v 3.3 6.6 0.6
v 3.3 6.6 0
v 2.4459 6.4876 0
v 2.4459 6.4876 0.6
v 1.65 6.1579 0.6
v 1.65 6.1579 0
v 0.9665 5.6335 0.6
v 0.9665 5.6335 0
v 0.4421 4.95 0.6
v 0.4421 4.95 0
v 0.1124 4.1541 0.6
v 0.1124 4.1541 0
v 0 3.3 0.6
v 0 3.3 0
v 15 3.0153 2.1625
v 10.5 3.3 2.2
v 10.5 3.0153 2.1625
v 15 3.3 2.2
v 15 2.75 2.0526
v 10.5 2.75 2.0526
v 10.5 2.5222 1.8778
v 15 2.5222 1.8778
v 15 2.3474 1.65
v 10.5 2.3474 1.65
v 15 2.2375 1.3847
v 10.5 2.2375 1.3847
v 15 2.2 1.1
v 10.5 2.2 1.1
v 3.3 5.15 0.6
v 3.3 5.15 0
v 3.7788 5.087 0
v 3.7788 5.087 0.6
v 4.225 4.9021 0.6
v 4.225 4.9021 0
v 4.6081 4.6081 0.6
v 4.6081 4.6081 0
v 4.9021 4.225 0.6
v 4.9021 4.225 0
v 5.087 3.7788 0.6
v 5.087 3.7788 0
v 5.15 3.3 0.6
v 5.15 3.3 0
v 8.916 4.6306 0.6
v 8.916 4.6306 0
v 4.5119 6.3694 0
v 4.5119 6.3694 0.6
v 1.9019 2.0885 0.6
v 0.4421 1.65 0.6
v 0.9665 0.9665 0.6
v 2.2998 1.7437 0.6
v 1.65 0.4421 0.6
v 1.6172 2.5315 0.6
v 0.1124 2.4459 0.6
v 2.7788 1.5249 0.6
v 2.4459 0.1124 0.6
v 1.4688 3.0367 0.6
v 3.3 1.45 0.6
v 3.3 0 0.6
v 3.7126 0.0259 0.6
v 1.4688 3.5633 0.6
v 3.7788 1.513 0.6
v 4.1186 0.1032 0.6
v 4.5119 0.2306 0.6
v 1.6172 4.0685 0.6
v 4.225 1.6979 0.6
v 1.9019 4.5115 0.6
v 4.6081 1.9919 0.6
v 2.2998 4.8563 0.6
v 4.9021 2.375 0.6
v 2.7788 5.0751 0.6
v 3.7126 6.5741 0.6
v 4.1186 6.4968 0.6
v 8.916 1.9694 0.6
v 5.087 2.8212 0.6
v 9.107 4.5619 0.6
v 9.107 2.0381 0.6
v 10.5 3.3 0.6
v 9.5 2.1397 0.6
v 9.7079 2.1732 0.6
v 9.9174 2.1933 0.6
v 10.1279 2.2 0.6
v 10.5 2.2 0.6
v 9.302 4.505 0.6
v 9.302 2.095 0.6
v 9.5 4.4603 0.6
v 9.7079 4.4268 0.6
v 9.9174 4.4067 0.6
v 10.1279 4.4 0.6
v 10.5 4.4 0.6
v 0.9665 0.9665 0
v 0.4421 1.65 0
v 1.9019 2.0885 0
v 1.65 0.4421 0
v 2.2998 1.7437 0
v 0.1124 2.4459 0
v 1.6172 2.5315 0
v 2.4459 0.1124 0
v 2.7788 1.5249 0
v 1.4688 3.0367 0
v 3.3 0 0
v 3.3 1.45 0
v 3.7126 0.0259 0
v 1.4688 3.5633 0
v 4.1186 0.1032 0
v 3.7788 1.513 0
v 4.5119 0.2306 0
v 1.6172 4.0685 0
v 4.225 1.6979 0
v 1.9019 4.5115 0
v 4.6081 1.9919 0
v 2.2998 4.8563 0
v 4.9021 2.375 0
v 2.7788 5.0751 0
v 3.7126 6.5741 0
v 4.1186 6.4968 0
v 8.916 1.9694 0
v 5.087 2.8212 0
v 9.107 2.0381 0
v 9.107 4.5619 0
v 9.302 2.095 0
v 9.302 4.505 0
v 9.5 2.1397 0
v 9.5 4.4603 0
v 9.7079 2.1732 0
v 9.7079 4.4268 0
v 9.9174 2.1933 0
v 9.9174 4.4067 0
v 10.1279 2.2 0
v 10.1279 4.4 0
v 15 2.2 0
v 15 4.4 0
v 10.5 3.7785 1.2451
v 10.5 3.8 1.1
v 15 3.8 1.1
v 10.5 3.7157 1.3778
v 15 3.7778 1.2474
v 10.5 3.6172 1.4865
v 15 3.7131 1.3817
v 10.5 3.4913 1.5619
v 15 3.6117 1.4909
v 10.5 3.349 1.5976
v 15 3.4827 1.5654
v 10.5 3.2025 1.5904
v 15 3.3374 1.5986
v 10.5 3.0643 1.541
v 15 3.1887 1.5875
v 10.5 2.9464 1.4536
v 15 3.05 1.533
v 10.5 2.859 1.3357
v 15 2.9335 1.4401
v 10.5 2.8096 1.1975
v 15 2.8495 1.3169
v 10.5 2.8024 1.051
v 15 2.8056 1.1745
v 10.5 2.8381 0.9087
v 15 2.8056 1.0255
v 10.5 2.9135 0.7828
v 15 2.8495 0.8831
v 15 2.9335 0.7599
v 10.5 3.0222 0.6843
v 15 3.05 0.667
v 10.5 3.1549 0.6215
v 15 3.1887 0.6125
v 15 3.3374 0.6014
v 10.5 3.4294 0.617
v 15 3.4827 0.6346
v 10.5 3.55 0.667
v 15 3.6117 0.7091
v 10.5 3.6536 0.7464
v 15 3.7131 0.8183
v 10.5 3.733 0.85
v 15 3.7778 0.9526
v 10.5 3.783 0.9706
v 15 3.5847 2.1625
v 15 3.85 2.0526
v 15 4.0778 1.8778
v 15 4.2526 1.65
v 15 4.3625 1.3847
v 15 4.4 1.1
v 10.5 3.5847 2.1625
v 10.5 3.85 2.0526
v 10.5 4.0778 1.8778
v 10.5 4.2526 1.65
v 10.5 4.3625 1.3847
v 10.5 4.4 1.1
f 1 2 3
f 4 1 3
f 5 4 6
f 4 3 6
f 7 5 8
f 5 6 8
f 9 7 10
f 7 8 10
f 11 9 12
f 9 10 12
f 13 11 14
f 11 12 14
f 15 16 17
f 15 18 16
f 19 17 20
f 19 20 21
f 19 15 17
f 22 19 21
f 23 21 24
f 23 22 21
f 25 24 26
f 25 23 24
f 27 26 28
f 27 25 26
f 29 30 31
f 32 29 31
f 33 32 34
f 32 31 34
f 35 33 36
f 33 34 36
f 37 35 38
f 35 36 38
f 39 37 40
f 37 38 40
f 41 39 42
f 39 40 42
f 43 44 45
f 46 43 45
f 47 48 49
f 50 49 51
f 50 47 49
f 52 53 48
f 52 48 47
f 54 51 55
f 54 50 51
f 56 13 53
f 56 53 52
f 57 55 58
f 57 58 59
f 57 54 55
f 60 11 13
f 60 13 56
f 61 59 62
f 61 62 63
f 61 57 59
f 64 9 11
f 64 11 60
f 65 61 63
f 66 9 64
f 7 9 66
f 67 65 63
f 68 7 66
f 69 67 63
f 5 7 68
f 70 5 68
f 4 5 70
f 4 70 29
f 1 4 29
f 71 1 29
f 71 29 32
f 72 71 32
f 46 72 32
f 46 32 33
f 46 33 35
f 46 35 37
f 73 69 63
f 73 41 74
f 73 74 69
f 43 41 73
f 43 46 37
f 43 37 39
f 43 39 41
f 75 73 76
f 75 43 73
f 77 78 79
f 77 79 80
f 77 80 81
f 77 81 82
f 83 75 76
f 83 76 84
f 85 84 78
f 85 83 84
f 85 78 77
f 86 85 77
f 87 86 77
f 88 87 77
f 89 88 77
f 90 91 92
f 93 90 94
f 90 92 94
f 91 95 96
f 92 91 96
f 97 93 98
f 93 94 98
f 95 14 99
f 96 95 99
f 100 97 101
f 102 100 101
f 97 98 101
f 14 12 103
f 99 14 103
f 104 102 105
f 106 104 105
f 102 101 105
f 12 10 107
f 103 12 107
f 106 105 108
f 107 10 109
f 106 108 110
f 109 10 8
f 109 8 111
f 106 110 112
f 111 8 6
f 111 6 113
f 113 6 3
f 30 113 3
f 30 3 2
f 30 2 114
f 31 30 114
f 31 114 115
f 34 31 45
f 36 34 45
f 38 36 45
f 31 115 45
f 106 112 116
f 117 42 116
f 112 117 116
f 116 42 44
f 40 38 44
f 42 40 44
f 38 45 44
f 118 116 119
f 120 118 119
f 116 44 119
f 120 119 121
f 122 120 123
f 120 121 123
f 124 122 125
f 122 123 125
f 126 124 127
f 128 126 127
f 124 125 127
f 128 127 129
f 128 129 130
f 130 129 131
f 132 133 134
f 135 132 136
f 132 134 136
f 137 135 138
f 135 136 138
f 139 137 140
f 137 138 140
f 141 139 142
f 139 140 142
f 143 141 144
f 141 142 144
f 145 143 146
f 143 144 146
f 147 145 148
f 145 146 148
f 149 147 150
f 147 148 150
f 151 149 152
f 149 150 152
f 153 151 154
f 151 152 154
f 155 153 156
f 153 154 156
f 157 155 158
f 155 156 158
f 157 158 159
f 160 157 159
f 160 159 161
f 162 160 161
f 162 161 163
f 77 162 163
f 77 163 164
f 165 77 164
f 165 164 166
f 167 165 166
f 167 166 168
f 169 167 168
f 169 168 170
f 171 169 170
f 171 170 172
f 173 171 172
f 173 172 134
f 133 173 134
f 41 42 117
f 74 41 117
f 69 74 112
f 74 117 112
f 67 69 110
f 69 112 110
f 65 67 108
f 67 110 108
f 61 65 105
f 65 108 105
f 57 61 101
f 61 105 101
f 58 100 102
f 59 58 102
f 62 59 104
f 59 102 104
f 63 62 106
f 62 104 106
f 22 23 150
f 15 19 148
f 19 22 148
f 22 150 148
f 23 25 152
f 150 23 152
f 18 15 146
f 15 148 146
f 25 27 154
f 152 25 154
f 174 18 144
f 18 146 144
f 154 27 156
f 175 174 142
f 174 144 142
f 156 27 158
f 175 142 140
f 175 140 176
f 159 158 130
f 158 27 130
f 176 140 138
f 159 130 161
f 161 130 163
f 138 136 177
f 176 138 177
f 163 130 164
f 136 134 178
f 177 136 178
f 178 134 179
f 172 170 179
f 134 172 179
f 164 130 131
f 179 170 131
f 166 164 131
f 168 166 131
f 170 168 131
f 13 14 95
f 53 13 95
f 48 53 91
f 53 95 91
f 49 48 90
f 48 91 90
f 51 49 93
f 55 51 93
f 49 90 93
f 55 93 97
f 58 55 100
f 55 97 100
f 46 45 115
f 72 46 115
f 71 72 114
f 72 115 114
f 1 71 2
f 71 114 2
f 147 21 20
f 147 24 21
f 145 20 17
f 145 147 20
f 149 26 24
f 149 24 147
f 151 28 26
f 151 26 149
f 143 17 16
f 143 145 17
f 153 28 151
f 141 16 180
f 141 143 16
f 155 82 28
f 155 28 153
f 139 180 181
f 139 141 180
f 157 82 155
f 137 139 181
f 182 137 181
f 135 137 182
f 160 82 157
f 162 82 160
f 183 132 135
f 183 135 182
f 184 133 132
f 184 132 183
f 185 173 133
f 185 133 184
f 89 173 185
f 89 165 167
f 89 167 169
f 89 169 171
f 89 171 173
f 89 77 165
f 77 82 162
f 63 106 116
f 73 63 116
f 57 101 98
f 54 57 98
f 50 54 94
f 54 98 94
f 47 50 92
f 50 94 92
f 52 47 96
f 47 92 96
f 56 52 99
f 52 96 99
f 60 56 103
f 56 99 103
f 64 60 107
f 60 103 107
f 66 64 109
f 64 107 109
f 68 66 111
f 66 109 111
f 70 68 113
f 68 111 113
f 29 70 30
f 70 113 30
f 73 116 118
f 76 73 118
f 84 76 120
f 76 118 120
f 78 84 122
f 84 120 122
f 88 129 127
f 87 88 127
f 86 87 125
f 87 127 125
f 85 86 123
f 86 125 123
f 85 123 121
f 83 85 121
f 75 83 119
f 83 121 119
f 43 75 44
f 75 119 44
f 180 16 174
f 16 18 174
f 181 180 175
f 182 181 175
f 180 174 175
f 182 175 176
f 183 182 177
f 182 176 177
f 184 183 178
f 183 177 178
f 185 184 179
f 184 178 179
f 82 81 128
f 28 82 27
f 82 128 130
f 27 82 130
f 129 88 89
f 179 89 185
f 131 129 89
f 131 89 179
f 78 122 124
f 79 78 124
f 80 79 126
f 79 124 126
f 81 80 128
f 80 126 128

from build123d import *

# Parameters (mm, degrees)
F0_W     = 4.5
F0_H     = 1.1
F1_DEPTH = 0.6
F2_W     = 4.5
F2_H     = 2.2
F3_DEPTH = 1.6
F4_R     = 1.09999
F5_R     = 0.5
F6_DEPTH = 25


# Not quite as in the source:
# - a fillet or chamfer is up to 0.001 mm smaller than in the source, because OpenCascade refuses the exact size


with BuildPart() as f1:
    # F0 (on Top) → F1 (new body)
    with BuildSketch(Plane.XY):
        with Locations((12.75, 2.75)):
            Rectangle(F0_W, F0_H)
        with Locations((12.75, 3.85)):
            Rectangle(F0_W, F0_H)
        with BuildLine():
            Line((10.1278736967, 2.2), (10.5, 2.2))
            Line((10.5, 2.2), (10.5, 3.3))
            Line((10.5, 3.3), (9.5, 3.3))
            Line((9.5, 3.3), (9.5, 2.1397182935))
            ThreePointArc((9.5, 2.1397182935), (9.8124932664, 2.1848950035), (10.1278736967, 2.2))
        make_face()
        with BuildLine():
            Line((9.5, 3.3), (10.5, 3.3))
            Line((10.5, 3.3), (10.5, 4.4))
            Line((10.5, 4.4), (10.1278736967, 4.4))
            ThreePointArc((10.1278736967, 4.4), (9.8124932664, 4.4151049965), (9.5, 4.4602817065))
            Line((9.5, 4.4602817065), (9.5, 3.3))
        make_face()
        with BuildLine():
            Line((9.5, 2.1397182935), (9.5, 3.3))
            Line((9.5, 3.3), (9.5, 4.4602817065))
            ThreePointArc((9.5, 4.4602817065), (9.2040660975, 4.5319438894), (8.9159970588, 4.6305774135))
            Line((8.9159970588, 4.6305774135), (4.5118766379, 6.3694225865))
            ThreePointArc((4.5118766379, 6.3694225865), (3.9168085053, 6.5418431899), (3.3, 6.6))
            Line((3.3, 6.6), (3.3, 5.15))
            ThreePointArc((3.3, 5.15), (4.6081475452, 4.6081475452), (5.15, 3.3))
            ThreePointArc((5.15, 3.3), (4.6081475452, 1.9918524548), (3.3, 1.45))
            Line((3.3, 1.45), (3.3, 0))
            ThreePointArc((3.3, 0), (3.9168085053, 0.0581568101), (4.5118766379, 0.2305774135))
            Line((4.5118766379, 0.2305774135), (8.9159970588, 1.9694225865))
            ThreePointArc((8.9159970588, 1.9694225865), (9.2040660975, 2.0680561106), (9.5, 2.1397182935))
        make_face()
        with BuildLine():
            ThreePointArc((0, 3.3), (0.9665476221, 0.9665476221), (3.3, 0))
            Line((3.3, 0), (3.3, 1.45))
            ThreePointArc((3.3, 1.45), (1.45, 3.3), (3.3, 5.15))
            Line((3.3, 5.15), (3.3, 6.6))
            ThreePointArc((3.3, 6.6), (0.9665476221, 5.6334523779), (0, 3.3))
        make_face()
    extrude(amount=F1_DEPTH)

    # F2 (on face) → F3 (join)
    with BuildSketch(Plane.XY.offset(0.6)):
        with Locations((12.75, 3.3)):
            Rectangle(F2_W, F2_H)
    extrude(amount=F3_DEPTH)

    # F4 (radius 1.1 in the source; OpenCascade refuses exactly that, so slightly less here)
    f4_edges = [f1.edges().sort_by_distance(p)[0] for p in [
        (12.75, 2.2, 2.2),
        (12.75, 4.4, 2.2),
    ]]
    fillet(f4_edges, radius=F4_R)

    # F5 (on face) → F6 (cut)
    with BuildSketch(Plane.YZ.offset(15)):
        with Locations((3.3, 1.1)):
            Circle(F5_R)
    extrude(amount=-F6_DEPTH, mode=Mode.SUBTRACT)


solid = f1.part
